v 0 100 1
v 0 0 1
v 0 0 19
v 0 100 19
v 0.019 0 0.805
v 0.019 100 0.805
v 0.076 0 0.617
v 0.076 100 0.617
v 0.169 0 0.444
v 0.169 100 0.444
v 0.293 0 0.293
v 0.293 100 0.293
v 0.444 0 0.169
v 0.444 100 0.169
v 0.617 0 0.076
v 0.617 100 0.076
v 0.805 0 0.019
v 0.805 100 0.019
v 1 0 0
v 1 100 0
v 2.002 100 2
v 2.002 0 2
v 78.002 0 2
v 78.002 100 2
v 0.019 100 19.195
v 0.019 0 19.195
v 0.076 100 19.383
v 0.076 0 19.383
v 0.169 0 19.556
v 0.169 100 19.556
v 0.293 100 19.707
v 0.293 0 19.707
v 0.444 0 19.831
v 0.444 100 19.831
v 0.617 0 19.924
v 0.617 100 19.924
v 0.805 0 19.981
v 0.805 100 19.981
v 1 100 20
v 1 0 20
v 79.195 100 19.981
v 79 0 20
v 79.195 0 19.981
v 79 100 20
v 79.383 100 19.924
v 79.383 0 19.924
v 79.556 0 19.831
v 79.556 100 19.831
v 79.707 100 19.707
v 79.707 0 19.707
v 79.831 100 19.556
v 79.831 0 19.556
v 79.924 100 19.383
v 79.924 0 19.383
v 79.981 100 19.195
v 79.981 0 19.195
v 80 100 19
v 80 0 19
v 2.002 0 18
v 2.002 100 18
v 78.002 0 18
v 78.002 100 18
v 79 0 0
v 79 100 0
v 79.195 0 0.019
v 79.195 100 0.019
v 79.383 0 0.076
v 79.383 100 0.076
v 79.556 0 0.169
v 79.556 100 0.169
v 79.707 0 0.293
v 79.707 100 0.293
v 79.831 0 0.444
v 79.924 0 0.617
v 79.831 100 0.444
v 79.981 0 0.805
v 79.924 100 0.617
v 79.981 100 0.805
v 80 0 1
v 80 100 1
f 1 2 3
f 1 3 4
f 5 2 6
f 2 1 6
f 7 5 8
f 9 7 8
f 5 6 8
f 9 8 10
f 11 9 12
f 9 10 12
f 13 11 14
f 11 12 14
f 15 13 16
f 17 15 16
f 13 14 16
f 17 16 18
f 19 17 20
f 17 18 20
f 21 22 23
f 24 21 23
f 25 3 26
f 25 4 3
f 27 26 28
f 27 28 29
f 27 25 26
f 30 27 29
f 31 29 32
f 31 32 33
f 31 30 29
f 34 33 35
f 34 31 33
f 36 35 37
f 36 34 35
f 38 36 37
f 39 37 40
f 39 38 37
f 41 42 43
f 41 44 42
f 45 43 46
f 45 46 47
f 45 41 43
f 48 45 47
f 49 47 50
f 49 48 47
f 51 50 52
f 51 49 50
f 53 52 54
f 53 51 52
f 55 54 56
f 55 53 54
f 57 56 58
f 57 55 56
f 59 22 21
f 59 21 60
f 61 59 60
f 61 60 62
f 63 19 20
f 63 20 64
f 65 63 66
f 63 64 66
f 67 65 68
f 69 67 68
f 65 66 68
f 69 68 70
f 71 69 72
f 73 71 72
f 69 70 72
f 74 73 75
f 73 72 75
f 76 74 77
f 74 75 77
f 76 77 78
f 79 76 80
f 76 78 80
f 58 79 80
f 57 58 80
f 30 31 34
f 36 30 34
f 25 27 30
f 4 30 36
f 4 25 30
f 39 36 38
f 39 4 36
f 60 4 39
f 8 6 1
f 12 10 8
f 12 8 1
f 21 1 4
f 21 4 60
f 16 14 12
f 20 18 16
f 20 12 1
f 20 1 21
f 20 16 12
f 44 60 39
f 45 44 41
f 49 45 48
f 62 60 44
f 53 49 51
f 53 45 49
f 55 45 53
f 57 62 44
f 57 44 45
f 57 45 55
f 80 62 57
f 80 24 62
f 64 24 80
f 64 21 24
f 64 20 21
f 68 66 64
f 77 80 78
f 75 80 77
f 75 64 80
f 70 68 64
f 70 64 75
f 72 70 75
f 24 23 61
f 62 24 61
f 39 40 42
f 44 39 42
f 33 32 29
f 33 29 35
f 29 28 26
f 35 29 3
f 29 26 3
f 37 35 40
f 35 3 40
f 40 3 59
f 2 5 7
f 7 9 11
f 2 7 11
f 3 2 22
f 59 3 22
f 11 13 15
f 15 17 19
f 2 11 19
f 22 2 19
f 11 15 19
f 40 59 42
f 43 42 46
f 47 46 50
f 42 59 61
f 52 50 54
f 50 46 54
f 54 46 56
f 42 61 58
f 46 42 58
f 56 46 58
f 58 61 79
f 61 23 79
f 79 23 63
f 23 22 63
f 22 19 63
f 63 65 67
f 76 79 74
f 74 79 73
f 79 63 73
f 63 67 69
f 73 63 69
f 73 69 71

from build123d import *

# Parameters (mm, degrees)
SKETCH_W     = 80
SKETCH_H     = 100
PAD_DEPTH    = 20
SKETCH001_W  = 76
SKETCH001_H  = 16
POCKET_DEPTH = 100.001
FILLET_R     = 1


with BuildPart() as part:
    # Sketch → Pad (new body)
    with BuildSketch(Plane.XY):
        with Locations((40, 50)):
            Rectangle(SKETCH_W, SKETCH_H)
    extrude(amount=PAD_DEPTH)

    # Sketch001 (on Face1 of Pad) → Pocket (cut, through all)
    with BuildSketch(Plane.XZ):
        with Locations((40.002224, 10)):
            Rectangle(SKETCH001_W, SKETCH001_H)
    extrude(amount=-POCKET_DEPTH, mode=Mode.SUBTRACT)

    # Fillet
    fillet_edges = [part.edges().sort_by_distance(p)[0] for p in [
        (0, 50, 0),
        (80, 50, 0),
        (0, 50, 20),
        (80, 50, 20),
    ]]
    fillet(fillet_edges, radius=FILLET_R)


solid = part.part
